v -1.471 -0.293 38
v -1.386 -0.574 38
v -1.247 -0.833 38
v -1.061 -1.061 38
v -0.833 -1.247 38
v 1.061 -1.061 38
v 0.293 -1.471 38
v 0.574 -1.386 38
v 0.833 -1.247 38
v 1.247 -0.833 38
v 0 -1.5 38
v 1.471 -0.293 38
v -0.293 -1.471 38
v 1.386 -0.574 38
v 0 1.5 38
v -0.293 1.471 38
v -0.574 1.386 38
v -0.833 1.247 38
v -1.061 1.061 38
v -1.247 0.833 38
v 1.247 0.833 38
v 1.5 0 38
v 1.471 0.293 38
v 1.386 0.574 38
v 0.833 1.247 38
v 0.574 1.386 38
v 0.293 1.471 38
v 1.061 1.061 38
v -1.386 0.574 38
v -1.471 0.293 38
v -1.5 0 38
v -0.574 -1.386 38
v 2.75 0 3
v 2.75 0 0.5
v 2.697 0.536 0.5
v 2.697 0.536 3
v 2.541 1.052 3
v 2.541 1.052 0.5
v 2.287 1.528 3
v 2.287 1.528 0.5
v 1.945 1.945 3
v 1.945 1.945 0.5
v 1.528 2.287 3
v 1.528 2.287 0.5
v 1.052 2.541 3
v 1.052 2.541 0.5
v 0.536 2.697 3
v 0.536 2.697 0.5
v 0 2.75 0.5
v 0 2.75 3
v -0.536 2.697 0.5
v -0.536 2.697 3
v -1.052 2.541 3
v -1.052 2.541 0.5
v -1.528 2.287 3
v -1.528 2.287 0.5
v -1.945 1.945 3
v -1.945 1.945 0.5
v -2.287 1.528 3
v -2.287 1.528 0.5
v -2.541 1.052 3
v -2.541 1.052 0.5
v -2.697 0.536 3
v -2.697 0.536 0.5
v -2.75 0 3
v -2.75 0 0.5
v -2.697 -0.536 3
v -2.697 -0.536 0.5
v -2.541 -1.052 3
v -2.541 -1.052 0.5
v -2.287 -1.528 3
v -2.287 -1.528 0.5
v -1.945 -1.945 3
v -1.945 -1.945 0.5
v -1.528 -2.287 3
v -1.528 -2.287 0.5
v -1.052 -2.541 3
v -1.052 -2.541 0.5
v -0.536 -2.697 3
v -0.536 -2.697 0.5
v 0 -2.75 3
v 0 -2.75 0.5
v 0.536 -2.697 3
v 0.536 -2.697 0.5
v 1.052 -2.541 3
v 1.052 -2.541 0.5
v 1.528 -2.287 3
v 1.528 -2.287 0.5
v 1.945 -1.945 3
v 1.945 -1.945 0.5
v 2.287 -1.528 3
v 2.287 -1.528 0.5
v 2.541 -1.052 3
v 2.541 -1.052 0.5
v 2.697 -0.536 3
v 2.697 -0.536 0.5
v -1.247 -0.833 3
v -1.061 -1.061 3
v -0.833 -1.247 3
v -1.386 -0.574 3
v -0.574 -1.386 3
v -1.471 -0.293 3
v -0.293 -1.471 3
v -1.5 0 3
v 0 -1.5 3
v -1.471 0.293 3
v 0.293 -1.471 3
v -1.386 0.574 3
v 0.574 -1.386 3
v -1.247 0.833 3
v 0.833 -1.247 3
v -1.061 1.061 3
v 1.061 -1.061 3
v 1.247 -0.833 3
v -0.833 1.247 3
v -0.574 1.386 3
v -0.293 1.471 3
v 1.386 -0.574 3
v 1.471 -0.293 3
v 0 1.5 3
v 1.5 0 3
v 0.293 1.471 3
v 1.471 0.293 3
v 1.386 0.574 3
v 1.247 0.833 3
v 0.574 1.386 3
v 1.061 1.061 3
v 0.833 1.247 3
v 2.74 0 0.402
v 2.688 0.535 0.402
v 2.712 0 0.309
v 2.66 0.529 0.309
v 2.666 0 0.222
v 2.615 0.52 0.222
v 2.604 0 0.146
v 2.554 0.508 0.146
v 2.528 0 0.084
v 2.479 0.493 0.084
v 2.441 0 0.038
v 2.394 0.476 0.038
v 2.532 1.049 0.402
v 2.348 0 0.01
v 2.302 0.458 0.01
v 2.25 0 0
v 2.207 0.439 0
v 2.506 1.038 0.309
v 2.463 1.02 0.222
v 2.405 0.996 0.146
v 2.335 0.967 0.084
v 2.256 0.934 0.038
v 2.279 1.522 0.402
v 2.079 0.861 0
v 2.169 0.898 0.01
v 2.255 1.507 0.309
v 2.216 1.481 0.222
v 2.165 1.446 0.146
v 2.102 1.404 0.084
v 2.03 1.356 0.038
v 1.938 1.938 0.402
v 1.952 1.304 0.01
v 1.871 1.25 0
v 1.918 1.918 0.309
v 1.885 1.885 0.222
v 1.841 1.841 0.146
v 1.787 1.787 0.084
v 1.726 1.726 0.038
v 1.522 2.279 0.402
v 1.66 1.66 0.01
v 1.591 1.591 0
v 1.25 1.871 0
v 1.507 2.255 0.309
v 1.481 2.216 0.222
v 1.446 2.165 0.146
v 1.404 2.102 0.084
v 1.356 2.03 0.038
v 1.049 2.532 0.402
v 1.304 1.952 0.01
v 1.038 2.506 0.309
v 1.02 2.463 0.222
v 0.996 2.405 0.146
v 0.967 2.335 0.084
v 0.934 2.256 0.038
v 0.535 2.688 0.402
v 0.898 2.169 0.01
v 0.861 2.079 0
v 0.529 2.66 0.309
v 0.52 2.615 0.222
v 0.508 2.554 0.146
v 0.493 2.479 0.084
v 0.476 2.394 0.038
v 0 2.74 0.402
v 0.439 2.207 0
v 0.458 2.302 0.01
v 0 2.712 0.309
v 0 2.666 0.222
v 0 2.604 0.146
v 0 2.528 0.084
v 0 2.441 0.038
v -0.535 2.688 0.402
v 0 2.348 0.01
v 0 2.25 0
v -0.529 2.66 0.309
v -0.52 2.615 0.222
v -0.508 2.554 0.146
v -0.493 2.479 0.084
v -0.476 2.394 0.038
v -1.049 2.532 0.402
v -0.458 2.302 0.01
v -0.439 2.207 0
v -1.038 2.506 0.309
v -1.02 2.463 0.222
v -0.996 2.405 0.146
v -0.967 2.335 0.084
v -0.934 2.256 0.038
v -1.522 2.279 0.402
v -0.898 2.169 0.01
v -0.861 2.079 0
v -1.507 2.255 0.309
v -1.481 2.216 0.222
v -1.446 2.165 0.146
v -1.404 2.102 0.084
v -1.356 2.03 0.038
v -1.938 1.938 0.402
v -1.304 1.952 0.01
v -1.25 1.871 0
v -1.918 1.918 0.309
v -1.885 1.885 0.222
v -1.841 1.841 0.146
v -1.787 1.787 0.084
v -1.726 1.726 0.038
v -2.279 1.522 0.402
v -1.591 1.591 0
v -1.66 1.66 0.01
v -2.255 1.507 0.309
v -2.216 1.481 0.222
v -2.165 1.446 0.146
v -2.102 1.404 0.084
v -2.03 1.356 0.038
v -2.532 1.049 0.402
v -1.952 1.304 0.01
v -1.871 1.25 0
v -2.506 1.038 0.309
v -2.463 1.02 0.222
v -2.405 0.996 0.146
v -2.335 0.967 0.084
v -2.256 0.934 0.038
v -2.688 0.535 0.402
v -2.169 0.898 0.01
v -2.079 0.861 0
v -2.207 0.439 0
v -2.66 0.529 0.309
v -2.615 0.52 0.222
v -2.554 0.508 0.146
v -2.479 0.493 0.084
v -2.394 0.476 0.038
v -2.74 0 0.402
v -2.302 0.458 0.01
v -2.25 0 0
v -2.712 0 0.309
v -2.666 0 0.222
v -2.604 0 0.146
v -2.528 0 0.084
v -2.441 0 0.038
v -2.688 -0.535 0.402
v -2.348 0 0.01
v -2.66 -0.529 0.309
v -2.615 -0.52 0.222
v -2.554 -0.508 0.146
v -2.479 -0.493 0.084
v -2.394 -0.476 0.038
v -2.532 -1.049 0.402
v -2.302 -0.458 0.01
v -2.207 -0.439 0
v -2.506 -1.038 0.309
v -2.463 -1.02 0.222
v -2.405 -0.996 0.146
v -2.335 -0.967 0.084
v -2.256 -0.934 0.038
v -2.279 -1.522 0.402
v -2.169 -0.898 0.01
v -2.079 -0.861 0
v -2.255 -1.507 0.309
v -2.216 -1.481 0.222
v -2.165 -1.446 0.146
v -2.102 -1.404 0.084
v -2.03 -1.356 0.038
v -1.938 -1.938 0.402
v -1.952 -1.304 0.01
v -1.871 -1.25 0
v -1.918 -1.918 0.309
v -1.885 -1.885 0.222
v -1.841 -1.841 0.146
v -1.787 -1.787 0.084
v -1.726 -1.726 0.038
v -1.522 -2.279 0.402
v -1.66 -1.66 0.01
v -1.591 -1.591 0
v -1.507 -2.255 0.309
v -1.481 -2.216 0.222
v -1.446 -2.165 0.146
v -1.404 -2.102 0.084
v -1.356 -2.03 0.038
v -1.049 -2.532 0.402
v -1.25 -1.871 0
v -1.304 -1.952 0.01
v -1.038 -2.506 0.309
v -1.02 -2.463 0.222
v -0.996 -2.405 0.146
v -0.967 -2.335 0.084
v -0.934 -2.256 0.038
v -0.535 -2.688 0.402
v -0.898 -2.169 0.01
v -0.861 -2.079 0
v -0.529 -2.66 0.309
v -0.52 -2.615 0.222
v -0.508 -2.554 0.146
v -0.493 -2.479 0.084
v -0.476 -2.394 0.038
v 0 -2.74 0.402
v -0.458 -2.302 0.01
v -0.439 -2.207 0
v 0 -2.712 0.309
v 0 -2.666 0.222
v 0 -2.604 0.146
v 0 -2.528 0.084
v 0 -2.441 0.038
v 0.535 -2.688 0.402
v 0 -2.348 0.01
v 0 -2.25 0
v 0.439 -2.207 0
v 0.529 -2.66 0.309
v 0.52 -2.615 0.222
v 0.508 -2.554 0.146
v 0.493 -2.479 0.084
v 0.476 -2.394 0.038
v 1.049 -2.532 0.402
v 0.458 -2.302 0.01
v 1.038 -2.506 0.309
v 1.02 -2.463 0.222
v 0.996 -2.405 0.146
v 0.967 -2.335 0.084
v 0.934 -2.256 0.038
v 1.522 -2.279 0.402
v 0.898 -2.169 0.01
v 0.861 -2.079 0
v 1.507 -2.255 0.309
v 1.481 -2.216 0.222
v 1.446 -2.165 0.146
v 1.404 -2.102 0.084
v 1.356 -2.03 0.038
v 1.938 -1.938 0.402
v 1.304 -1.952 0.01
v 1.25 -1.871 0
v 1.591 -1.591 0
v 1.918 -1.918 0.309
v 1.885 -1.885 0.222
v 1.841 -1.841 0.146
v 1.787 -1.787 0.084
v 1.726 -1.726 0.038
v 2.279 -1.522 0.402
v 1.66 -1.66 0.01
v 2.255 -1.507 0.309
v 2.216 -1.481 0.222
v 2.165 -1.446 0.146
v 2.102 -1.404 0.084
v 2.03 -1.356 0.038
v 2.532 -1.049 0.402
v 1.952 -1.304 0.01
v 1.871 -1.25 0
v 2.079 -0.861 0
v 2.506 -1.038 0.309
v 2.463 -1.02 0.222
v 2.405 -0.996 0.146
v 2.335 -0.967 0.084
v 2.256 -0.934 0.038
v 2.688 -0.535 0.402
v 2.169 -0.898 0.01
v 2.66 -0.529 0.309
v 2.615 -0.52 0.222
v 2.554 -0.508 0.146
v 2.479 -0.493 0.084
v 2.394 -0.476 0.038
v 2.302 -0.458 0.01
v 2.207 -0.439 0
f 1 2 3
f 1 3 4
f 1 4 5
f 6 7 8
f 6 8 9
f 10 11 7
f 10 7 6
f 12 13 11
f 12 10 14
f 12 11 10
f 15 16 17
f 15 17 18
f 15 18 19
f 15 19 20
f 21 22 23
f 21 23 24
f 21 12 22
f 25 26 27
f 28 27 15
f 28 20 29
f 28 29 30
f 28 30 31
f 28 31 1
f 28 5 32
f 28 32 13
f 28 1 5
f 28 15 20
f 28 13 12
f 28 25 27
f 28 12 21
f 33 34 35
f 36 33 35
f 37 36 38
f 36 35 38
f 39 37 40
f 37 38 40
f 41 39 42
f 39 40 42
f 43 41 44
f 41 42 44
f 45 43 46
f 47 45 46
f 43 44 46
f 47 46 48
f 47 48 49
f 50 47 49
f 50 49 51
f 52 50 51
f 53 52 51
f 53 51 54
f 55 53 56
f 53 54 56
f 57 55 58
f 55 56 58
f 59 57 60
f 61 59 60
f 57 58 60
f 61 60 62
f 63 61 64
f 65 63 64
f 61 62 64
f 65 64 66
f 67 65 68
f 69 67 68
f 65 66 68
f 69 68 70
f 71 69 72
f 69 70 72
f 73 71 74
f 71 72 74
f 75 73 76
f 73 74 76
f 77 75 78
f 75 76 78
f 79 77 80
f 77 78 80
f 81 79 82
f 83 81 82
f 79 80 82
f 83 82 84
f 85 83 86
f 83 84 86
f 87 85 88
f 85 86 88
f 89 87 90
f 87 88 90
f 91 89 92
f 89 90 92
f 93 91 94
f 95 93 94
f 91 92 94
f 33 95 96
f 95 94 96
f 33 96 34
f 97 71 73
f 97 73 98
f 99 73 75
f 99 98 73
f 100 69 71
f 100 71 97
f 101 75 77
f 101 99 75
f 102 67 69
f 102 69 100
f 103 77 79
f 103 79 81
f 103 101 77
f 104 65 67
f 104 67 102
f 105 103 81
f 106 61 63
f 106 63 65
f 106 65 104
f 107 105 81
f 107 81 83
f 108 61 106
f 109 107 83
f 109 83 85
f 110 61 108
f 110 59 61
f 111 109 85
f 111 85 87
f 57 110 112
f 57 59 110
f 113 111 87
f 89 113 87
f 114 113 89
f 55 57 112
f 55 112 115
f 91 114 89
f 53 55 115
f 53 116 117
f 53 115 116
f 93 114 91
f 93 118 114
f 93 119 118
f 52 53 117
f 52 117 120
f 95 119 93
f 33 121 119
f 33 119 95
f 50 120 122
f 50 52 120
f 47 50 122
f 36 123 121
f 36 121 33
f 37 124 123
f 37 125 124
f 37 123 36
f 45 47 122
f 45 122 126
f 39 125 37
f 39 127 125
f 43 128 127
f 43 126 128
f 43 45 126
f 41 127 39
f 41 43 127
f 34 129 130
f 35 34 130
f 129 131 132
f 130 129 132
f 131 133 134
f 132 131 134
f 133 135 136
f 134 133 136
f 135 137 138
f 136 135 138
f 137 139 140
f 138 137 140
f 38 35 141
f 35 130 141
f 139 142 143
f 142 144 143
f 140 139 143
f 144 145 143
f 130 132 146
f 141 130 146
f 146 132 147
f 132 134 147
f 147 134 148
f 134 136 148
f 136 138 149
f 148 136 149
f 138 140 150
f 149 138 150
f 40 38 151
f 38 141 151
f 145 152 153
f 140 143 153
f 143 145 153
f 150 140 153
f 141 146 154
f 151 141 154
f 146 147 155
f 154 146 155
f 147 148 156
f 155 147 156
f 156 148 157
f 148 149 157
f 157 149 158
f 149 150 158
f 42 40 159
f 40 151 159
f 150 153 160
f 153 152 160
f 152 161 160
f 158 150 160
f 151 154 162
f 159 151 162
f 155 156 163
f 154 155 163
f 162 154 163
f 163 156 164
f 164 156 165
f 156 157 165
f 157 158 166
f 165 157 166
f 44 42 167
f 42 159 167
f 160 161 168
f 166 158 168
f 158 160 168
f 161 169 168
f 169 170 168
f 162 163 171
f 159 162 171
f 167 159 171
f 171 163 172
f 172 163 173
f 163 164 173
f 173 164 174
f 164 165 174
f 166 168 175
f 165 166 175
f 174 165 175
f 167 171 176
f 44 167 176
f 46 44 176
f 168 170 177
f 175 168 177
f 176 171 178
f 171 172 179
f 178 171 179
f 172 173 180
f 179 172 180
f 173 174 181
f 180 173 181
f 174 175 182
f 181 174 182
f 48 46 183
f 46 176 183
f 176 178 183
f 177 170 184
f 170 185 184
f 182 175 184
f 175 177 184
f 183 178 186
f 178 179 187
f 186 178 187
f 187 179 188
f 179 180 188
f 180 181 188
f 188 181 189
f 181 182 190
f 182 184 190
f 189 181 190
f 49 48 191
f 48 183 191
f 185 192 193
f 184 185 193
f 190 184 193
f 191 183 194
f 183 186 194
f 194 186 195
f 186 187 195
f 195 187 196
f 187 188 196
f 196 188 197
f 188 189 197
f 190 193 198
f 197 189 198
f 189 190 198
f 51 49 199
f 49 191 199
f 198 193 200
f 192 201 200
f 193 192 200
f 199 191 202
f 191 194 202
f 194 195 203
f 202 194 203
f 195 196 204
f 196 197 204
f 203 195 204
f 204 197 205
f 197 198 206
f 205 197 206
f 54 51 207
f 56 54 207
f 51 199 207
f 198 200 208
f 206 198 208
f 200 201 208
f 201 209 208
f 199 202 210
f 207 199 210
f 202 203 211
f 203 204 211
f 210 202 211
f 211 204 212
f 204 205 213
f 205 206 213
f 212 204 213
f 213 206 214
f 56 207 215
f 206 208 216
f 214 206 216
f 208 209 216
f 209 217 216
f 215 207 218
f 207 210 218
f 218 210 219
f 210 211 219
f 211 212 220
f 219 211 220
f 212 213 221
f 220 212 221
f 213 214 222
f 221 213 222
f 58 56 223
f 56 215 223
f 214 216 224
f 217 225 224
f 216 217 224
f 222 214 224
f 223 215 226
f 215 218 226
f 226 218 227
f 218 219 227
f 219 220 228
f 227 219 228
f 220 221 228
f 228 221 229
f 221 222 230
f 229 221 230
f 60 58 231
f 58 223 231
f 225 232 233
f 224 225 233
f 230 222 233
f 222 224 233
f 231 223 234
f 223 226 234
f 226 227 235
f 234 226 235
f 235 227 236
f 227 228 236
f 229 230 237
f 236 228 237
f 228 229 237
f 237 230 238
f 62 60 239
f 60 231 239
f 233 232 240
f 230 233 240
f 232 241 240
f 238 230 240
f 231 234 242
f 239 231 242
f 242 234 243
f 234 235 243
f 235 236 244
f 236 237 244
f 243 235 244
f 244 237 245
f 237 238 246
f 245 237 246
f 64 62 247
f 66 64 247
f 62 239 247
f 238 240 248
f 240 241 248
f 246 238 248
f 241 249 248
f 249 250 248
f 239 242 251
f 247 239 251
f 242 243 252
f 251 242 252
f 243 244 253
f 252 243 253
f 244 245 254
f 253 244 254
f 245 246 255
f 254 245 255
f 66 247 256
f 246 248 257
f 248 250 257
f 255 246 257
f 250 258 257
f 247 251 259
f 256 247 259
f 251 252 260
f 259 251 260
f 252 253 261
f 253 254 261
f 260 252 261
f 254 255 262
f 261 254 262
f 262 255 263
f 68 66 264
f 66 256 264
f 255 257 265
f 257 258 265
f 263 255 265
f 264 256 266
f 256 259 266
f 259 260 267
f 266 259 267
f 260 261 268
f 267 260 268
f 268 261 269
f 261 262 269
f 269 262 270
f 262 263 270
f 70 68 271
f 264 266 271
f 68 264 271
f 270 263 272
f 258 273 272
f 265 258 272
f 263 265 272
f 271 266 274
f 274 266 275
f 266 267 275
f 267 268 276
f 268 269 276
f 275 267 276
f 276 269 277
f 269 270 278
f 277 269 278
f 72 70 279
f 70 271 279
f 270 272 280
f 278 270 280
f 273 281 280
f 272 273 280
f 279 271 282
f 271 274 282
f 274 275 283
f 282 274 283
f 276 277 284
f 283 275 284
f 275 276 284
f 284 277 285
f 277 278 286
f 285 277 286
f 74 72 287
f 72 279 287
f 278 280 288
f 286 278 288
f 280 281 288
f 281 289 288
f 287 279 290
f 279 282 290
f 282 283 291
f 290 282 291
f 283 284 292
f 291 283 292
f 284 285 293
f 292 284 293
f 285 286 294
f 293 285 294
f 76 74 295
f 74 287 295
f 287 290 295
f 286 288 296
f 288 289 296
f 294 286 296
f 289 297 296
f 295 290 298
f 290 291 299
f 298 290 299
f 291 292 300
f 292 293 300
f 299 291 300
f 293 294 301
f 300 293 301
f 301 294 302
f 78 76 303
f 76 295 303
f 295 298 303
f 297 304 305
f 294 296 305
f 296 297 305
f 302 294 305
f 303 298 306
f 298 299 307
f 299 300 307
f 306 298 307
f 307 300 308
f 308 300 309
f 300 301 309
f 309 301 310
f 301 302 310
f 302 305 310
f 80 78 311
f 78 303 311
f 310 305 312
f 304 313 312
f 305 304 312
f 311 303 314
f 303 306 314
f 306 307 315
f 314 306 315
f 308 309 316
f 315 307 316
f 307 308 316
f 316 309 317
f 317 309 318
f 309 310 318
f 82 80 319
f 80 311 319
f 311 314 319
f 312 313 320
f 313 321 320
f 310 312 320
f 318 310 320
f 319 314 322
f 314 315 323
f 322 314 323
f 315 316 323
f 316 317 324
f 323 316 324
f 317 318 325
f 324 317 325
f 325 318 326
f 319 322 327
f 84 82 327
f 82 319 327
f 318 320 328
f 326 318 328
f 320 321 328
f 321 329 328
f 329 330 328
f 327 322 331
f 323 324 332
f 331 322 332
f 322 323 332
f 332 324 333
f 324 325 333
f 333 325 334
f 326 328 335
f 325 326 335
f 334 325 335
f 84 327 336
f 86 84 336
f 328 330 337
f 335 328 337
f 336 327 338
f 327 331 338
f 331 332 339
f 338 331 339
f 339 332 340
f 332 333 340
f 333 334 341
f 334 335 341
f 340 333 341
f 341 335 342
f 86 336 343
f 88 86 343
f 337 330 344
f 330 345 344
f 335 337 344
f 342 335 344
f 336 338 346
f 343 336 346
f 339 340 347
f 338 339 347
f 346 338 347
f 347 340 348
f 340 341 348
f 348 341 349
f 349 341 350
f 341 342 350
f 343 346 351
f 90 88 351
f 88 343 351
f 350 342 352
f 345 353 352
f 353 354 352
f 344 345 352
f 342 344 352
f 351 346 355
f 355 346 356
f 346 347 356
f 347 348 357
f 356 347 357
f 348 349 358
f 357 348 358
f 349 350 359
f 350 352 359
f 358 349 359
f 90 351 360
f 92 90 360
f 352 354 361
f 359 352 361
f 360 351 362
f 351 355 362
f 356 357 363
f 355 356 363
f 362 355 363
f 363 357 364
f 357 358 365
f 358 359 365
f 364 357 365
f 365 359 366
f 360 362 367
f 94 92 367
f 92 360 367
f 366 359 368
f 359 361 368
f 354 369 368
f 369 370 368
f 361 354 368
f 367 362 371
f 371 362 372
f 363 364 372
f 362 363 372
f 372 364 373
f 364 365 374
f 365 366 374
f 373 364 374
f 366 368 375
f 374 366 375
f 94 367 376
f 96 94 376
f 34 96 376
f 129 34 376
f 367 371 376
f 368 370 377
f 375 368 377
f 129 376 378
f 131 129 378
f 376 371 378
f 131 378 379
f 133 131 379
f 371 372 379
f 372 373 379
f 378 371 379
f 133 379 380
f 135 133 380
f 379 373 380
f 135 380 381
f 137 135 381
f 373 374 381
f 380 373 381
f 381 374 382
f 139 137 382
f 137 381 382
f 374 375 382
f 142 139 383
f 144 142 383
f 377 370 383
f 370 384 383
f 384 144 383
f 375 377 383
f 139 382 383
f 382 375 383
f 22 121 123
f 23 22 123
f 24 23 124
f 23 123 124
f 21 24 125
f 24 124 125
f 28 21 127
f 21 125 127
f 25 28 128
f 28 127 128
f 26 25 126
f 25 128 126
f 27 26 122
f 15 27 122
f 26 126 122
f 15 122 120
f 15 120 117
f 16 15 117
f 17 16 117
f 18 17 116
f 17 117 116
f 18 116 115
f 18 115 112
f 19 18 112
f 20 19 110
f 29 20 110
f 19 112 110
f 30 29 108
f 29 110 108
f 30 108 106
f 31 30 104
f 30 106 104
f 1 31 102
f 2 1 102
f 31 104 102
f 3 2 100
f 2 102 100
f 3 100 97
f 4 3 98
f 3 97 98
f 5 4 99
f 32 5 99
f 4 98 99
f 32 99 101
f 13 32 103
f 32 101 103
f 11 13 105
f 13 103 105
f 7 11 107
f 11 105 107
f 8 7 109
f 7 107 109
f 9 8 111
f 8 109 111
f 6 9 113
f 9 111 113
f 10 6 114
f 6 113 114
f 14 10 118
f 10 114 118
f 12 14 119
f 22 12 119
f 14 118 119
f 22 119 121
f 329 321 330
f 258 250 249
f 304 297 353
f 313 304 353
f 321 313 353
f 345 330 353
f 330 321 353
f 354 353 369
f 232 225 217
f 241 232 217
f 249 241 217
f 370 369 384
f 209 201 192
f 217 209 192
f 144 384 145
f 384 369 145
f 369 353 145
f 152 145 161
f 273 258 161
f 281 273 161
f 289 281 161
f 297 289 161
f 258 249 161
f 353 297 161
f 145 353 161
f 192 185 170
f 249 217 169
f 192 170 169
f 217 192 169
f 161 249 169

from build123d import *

# Parameters (mm, degrees)
SKETCH_2_R      = 2.75
EXTRUDE_1_DEPTH = 3
SKETCH_3_R      = 1.5
EXTRUDE_2_DEPTH = 35
FILLET_1_R      = 0.5


with BuildPart() as part:
    # ｽｹｯﾁ2 → ﾎﾞｽ - 押し出し1 (new body)
    with BuildSketch(Plane.XY):
        Circle(SKETCH_2_R)
    extrude(amount=EXTRUDE_1_DEPTH)

    # ｽｹｯﾁ3 → ﾎﾞｽ - 押し出し2 (add)
    with BuildSketch(Plane.XY.offset(3)):
        Circle(SKETCH_3_R)
    extrude(amount=EXTRUDE_2_DEPTH)

    # ﾌｨﾚｯﾄ1
    fillet_1_edges = [part.edges().sort_by_distance(p)[0] for p in [
        (-2.75, 0, 0),
    ]]
    fillet(fillet_1_edges, radius=FILLET_1_R)


solid = part.part
